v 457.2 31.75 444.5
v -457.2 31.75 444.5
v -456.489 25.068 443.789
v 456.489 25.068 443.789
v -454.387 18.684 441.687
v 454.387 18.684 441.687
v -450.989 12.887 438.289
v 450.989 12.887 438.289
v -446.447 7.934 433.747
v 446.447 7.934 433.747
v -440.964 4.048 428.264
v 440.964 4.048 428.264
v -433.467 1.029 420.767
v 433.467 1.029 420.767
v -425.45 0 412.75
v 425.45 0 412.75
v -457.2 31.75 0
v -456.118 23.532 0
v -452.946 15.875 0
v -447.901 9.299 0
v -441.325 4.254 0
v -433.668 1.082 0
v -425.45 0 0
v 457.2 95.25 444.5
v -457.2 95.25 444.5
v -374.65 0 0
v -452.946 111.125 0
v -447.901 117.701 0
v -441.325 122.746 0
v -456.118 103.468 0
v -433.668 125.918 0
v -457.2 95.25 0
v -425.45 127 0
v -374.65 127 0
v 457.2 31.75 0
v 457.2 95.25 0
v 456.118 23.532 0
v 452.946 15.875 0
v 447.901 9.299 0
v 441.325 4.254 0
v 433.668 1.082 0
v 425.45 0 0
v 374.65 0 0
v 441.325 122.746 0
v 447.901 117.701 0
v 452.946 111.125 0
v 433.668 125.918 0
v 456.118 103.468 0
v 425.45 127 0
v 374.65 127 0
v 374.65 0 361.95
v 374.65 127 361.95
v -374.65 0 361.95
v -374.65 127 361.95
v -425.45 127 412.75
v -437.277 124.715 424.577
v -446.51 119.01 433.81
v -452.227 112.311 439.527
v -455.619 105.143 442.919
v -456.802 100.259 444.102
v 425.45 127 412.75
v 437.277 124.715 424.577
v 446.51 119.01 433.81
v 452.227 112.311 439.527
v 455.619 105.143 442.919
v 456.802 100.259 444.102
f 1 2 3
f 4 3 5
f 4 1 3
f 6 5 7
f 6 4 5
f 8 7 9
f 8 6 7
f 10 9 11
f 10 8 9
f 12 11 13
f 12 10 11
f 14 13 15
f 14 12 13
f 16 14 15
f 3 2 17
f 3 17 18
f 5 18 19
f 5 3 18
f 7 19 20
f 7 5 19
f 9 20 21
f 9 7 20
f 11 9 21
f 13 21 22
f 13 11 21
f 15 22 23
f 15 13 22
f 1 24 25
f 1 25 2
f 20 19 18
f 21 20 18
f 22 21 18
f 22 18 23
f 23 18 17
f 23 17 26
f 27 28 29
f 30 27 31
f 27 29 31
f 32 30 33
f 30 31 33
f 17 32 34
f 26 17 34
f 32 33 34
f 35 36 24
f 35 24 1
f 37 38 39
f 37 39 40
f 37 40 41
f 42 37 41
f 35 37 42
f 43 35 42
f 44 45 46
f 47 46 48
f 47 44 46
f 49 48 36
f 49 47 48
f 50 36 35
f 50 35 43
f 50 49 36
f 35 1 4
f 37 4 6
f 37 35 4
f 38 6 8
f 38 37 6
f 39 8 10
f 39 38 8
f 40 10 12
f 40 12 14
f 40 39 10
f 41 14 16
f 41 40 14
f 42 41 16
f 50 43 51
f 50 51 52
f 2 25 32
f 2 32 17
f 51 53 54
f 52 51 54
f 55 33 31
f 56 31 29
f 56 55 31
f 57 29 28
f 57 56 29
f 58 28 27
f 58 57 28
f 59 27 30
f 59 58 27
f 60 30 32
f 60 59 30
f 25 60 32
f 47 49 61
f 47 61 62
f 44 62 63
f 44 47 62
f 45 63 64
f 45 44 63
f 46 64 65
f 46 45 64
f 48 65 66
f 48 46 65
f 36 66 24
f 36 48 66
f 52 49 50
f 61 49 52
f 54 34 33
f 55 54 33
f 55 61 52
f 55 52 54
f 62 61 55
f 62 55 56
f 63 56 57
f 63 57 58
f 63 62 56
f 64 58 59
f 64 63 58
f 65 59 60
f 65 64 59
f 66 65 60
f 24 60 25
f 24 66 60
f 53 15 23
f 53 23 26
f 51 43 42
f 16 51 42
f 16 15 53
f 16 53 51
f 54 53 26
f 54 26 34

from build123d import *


with BuildPart() as part:
    # Sweep1: sweep along a path in Sketch2
    with BuildLine(Plane(origin=(0, 0, 0), x_dir=(1, 0, 0), z_dir=(0, 1, 0))) as sweep1_path:
        Line((-374.65, 0), (-374.65, -361.95))
        Line((-374.65, -361.95), (374.65, -361.95))
        Line((374.65, -361.95), (374.65, 0))
    # Sketch1 → Sweep1 (sweep)
    with BuildSketch(Plane.XY):
        with BuildLine():
            Line((-393.7, 127), (-425.45, 127))
            ThreePointArc((-425.45, 127), (-447.900640303, 117.700640303), (-457.2, 95.25))
            Line((-457.2, 95.25), (-457.2, 31.75))
            ThreePointArc((-457.2, 31.75), (-447.900640303, 9.299359697), (-425.45, 0))
            Line((-425.45, 0), (-393.7, 0))
            Line((-393.7, 0), (-374.65, 0))
            Line((-374.65, 0), (-374.65, 127))
            Line((-374.65, 127), (-393.7, 127))
        make_face()
    sweep(path=sweep1_path.line, transition=Transition.RIGHT)


solid = part.part
